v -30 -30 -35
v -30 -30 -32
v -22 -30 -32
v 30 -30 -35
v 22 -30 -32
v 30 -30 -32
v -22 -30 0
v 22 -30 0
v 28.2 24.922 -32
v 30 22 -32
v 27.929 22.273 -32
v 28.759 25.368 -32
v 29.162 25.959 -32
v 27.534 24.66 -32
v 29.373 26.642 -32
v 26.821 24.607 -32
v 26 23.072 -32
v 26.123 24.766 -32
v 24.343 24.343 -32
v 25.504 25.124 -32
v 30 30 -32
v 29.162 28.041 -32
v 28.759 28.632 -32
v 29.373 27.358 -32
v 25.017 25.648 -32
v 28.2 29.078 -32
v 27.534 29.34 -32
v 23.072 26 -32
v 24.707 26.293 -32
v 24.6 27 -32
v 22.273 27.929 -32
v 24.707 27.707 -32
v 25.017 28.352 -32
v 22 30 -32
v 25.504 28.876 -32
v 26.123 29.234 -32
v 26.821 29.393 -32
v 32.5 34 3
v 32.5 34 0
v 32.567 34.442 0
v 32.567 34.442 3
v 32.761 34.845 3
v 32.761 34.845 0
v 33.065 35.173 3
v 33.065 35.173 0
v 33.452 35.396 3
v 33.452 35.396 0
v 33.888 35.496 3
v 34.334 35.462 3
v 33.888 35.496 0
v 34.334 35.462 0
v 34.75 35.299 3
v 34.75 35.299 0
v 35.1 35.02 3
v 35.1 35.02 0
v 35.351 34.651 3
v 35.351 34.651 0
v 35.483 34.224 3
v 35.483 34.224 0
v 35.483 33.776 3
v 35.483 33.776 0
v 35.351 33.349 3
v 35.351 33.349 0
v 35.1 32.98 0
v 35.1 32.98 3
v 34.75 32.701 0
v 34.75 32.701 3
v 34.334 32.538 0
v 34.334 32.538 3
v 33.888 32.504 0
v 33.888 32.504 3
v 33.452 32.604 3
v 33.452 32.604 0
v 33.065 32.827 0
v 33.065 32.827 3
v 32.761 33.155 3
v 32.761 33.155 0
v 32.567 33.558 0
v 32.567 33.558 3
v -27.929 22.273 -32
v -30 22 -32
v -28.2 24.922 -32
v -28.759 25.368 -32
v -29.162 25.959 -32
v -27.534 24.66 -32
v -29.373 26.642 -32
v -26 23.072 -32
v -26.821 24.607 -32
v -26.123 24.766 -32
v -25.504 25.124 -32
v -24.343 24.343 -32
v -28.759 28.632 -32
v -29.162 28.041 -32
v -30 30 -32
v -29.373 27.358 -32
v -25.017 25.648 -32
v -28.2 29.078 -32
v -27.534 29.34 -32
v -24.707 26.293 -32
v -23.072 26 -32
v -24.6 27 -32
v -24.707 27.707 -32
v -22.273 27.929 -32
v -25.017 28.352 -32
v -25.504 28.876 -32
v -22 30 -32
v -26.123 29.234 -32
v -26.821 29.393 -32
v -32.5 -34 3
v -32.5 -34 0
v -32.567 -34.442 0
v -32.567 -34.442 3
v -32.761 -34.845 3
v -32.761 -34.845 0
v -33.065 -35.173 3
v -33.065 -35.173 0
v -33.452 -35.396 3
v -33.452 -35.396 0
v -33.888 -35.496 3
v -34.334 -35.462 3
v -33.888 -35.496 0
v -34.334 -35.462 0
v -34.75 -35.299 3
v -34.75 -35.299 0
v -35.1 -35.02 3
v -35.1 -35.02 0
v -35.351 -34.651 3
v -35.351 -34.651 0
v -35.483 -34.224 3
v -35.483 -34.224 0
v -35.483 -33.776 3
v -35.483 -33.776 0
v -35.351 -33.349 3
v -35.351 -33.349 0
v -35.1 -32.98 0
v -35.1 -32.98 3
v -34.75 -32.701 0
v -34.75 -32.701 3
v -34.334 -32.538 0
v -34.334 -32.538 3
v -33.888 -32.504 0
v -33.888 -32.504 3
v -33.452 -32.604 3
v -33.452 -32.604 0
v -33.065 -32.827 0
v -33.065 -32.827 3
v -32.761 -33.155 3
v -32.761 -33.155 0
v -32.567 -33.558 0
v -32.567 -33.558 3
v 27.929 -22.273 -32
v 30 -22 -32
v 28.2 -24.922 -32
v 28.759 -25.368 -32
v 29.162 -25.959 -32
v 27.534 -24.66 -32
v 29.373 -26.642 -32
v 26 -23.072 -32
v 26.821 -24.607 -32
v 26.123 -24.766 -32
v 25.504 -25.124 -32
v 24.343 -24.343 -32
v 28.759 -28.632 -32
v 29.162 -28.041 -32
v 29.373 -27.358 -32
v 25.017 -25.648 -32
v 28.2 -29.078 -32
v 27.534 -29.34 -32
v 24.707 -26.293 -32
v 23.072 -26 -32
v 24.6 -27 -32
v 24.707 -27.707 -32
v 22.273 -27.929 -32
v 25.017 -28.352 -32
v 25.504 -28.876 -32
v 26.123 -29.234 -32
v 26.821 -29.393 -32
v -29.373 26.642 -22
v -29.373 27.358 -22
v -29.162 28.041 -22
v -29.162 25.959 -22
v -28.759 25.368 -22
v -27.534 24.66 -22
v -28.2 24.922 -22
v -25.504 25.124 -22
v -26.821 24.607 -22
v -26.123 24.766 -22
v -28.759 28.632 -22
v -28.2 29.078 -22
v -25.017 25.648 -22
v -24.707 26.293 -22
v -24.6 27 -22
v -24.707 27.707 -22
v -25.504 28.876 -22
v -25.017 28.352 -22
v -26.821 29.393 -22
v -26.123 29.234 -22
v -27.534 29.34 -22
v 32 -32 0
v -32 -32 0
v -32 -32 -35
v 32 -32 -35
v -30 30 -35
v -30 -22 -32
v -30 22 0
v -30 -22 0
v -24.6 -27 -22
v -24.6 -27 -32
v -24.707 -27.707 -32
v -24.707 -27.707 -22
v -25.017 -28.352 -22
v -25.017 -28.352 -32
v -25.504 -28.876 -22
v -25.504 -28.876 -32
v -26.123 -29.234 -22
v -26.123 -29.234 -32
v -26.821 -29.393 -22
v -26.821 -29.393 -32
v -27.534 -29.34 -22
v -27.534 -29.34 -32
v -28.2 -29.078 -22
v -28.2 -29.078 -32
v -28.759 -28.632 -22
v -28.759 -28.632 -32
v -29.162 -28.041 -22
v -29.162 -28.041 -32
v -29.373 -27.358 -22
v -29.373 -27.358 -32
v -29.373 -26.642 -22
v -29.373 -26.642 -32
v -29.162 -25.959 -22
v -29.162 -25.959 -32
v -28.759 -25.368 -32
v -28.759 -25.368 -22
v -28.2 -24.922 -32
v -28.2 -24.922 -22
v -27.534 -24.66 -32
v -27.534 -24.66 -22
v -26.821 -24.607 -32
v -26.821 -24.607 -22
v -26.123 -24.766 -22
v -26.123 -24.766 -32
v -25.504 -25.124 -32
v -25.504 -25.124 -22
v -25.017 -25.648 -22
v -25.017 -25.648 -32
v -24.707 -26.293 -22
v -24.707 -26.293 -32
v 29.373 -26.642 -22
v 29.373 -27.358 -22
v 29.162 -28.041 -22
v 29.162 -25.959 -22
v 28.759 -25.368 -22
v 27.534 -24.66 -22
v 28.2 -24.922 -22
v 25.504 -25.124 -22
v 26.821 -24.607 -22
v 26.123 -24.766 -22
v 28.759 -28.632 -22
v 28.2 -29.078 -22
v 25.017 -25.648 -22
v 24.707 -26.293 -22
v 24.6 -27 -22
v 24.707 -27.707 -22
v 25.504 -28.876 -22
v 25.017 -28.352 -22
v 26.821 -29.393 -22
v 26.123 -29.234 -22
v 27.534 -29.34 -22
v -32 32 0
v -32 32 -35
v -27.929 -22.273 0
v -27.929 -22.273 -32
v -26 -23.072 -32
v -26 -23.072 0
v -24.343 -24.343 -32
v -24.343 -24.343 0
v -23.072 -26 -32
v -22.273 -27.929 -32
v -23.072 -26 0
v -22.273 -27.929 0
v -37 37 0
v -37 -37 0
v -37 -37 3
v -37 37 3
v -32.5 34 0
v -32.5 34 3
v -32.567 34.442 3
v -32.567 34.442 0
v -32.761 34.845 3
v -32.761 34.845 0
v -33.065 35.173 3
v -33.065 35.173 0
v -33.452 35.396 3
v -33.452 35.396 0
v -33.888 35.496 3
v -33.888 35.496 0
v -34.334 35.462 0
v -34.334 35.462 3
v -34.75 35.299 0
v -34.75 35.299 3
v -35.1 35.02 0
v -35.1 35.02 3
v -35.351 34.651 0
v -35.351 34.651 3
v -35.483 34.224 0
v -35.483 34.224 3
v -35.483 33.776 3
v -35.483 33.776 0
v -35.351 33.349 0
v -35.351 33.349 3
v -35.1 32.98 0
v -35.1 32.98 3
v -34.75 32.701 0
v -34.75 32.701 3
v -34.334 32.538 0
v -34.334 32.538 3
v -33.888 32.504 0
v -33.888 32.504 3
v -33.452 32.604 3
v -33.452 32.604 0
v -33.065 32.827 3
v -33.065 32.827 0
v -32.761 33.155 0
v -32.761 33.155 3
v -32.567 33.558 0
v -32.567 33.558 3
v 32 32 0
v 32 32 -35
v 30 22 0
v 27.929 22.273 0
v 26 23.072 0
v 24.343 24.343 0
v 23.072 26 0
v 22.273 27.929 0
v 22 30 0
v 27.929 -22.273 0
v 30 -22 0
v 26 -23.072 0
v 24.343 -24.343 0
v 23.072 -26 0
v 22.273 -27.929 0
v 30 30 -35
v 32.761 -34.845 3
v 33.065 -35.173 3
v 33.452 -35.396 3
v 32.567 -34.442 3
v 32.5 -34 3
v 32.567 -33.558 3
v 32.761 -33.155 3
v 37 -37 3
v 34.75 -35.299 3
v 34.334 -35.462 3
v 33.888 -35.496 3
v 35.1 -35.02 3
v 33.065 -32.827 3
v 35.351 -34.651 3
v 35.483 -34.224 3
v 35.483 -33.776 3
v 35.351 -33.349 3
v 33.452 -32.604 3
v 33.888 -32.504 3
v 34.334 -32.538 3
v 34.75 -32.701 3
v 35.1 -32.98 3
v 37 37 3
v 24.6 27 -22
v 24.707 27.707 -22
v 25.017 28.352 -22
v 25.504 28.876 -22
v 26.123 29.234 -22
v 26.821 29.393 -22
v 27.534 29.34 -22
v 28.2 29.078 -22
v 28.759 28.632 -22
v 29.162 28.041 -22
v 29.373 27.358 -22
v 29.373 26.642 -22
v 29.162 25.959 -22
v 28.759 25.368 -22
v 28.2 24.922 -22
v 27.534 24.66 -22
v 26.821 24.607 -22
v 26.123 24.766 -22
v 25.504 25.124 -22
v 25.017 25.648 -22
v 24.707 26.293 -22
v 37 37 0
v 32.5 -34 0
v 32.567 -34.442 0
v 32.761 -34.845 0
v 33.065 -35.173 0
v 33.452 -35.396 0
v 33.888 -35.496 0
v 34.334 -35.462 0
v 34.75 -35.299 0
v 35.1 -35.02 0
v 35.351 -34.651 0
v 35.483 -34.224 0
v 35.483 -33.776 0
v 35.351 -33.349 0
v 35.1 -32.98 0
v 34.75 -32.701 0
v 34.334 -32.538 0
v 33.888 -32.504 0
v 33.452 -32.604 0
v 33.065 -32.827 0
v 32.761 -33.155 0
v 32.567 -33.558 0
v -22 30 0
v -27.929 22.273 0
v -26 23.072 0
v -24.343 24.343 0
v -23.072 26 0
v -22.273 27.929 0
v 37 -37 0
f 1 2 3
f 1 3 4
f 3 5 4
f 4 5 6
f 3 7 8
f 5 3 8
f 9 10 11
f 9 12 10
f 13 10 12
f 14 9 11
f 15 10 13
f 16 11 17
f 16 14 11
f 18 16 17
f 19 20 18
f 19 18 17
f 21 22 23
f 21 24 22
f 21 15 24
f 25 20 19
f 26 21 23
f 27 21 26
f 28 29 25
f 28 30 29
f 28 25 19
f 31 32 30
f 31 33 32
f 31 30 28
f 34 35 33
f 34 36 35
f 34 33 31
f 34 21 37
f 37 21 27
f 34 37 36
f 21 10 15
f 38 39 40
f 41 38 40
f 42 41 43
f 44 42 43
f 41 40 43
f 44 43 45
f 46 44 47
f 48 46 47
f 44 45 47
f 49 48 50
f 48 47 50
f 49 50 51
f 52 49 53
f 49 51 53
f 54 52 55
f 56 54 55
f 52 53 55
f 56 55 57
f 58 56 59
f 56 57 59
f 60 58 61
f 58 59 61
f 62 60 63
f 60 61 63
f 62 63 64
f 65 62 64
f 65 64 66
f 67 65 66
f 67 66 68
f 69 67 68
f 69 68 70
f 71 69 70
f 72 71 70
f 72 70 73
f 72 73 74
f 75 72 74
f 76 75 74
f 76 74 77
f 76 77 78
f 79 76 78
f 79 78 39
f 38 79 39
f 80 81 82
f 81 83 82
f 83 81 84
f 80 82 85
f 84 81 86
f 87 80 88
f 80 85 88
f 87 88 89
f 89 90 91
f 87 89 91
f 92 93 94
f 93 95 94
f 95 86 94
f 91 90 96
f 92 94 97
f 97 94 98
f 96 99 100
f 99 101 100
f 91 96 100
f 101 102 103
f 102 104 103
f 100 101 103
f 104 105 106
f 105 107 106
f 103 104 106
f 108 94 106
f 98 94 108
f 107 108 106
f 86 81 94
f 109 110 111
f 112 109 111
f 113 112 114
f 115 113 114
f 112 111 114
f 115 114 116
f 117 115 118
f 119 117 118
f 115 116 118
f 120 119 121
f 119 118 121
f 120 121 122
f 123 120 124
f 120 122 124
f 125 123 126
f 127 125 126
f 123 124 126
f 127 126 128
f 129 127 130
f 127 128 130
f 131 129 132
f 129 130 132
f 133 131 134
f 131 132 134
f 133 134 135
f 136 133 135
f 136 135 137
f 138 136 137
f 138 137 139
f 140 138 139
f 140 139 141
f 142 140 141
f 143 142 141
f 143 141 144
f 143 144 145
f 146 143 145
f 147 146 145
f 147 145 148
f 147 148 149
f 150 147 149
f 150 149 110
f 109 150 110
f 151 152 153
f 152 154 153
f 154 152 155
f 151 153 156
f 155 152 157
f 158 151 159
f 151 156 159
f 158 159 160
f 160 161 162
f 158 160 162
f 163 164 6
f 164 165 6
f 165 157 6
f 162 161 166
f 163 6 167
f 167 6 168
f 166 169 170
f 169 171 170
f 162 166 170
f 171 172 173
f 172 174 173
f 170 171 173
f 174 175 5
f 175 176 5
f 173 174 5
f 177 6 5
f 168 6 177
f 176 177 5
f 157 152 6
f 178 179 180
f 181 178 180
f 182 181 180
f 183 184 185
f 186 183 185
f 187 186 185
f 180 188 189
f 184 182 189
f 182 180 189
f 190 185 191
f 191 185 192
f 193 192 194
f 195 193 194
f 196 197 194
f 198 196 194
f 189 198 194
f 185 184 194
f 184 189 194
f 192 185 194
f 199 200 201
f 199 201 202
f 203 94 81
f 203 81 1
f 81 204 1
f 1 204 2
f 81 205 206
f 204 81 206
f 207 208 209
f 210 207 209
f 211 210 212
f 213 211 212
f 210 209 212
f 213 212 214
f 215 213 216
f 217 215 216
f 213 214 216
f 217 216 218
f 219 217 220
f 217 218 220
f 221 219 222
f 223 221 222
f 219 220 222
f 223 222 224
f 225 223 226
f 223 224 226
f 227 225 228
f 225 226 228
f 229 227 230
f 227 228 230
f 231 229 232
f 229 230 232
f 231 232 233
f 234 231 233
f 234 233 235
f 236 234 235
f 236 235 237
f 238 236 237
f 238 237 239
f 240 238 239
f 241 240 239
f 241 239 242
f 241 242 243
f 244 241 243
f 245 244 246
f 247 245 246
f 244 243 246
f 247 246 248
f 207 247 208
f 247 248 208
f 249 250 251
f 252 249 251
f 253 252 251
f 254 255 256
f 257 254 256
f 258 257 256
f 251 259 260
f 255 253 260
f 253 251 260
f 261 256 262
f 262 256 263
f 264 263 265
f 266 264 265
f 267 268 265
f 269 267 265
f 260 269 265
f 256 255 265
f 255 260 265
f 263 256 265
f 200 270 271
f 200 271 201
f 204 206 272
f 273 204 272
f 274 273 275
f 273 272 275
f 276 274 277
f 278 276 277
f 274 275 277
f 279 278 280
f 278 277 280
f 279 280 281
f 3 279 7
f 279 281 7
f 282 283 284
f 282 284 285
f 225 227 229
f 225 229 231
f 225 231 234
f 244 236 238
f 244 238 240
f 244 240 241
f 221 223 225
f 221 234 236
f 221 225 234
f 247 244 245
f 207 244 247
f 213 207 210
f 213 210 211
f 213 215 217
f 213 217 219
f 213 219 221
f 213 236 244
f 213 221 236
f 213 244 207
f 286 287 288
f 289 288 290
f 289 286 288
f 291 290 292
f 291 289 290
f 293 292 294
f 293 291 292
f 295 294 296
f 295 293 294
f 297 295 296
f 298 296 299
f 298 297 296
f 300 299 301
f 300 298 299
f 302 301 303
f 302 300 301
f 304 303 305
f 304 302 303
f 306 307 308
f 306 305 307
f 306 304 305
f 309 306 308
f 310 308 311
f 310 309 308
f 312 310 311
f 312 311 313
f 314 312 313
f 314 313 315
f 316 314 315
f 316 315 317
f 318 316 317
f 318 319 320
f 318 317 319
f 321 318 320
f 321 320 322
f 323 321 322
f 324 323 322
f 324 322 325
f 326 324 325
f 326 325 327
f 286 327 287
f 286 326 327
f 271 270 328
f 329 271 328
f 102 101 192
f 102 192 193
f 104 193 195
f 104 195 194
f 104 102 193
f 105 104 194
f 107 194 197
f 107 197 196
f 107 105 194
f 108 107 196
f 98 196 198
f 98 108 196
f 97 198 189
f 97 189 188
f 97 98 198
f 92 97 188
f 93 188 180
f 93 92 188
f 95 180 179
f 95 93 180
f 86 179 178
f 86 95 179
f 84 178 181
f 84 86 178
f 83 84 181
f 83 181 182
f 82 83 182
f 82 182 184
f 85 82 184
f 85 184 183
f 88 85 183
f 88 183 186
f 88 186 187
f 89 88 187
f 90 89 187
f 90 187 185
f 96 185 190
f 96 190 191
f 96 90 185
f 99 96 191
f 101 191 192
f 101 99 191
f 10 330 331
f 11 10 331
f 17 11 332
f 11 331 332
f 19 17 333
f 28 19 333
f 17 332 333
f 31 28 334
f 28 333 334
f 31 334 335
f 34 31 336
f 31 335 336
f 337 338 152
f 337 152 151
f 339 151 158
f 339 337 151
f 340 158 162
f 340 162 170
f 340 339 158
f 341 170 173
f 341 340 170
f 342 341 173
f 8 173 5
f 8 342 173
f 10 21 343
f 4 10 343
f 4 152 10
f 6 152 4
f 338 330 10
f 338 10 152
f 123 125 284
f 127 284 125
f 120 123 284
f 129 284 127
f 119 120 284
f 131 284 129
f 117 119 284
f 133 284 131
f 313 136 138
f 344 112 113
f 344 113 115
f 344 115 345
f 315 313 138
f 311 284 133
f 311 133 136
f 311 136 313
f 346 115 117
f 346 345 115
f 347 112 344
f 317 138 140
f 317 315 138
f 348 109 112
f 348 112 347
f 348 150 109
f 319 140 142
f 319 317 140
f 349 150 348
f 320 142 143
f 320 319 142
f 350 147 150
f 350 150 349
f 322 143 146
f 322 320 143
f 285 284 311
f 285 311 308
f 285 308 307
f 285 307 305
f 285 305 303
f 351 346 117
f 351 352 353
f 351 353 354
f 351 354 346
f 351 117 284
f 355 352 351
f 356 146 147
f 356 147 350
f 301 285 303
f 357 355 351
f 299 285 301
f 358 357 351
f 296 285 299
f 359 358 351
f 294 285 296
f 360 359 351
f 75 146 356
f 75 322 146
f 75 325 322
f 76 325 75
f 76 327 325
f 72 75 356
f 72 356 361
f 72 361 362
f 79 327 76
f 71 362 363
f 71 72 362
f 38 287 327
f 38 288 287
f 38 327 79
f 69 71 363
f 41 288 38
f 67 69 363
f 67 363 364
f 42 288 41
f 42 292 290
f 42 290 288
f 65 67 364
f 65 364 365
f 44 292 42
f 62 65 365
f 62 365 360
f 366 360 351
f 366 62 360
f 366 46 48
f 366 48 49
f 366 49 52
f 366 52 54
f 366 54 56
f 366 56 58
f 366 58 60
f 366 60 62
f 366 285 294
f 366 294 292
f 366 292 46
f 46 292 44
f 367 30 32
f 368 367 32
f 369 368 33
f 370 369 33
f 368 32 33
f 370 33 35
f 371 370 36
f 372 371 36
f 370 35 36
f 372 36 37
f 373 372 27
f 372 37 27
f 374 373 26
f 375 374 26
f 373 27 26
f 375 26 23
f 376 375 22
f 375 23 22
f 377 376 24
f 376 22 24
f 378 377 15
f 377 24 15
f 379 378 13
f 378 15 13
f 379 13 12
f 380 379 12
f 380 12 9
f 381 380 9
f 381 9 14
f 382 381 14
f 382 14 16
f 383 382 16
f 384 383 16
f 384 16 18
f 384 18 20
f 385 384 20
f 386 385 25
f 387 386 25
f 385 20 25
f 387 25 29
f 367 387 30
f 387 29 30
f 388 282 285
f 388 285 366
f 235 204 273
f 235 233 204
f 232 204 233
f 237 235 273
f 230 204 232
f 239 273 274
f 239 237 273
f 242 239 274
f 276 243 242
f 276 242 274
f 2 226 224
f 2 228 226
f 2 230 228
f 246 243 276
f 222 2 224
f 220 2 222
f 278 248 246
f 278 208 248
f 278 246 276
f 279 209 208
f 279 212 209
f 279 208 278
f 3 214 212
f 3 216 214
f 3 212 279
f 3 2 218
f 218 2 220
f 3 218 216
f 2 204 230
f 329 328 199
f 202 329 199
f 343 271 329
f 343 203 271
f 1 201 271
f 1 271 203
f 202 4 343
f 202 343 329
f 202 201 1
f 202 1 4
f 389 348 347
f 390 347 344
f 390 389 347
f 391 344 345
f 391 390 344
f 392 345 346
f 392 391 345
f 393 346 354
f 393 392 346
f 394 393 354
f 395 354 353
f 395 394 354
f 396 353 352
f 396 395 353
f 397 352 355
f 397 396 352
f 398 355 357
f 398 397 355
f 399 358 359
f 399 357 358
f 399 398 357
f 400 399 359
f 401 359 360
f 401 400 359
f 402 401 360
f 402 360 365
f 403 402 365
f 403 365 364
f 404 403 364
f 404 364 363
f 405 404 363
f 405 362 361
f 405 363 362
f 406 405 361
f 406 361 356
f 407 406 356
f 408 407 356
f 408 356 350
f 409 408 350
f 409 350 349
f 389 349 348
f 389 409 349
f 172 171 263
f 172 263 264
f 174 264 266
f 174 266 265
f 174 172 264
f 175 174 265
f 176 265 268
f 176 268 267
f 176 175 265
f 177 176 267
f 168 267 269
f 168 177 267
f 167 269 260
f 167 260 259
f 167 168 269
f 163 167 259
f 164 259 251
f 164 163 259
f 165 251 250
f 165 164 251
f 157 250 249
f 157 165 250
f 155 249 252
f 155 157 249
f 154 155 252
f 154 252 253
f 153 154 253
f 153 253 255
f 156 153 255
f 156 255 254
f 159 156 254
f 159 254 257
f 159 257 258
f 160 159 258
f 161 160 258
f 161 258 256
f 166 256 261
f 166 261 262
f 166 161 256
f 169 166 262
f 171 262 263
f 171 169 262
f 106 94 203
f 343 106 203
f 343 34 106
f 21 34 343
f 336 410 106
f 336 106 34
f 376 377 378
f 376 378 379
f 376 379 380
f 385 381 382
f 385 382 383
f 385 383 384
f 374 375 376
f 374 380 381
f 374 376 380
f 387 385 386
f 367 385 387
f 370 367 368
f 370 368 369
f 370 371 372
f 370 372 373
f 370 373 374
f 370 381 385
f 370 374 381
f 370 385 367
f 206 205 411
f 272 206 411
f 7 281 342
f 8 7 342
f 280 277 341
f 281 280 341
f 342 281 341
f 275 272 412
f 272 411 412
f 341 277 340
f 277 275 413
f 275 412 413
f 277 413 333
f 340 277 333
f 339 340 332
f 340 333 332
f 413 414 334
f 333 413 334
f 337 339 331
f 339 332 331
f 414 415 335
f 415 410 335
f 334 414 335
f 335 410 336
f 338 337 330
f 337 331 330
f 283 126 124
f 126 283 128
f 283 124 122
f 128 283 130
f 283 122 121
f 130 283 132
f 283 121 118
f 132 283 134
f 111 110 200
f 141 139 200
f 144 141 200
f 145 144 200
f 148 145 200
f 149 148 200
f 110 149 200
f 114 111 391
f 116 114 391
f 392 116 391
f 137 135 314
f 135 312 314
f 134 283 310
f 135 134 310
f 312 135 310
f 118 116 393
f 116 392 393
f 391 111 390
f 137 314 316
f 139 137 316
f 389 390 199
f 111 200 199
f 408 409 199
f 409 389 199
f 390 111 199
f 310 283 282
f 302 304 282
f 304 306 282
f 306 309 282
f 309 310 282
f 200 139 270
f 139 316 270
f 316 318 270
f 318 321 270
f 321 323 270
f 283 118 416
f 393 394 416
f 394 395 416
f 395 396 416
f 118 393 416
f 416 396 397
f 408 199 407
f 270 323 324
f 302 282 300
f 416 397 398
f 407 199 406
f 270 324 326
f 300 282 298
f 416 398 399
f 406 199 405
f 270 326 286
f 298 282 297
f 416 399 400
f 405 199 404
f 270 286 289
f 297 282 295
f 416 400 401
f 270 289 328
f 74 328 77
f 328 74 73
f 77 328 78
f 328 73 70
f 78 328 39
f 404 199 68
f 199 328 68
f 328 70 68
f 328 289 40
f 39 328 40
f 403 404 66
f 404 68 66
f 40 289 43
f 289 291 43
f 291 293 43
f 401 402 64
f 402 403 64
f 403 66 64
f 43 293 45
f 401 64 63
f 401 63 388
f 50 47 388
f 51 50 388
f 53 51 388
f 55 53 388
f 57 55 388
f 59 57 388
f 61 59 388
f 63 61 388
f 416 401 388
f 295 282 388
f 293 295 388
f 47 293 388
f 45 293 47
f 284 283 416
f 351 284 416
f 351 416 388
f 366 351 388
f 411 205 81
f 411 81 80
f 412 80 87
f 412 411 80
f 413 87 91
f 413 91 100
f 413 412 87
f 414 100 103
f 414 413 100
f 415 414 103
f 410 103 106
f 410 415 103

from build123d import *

# Parameters (mm, degrees)
SKETCH_W                   = 74
SKETCH_H                   = 74
PAD_DEPTH                  = 3
SKETCH002_W                = 64
SKETCH002_H                = 64
SKETCH002_W_2              = 60
SKETCH002_H_2              = 60
PAD001_DEPTH               = 35
SKETCH003_R                = 1.5
POCKET_DEPTH               = 225.675651
PAD002_DEPTH               = 32
SKETCH005_R                = 2.4
POCKET001_DEPTH            = 10
SKETCH003_MIRRORED_2_R     = 1.5
POCKET_MIRRORED_2_DEPTH    = 225.675651
PAD002_MIRRORED_2_DEPTH    = 32
SKETCH005_MIRRORED_2_R     = 2.4
POCKET001_MIRRORED_2_DEPTH = 10


with BuildPart() as part:
    # Sketch → Pad (new body)
    with BuildSketch(Plane.XY):
        Rectangle(SKETCH_W, SKETCH_H)
    extrude(amount=PAD_DEPTH)

    # Sketch002 (on Face5 of Pad) → Pad001 (join)
    with BuildSketch(Plane(origin=(0, 0, 0), x_dir=(1, 0, 0), z_dir=(0, 0, -1))):
        Rectangle(SKETCH002_W, SKETCH002_H)
        Rectangle(SKETCH002_W_2, SKETCH002_H_2, mode=Mode.SUBTRACT)
    extrude(amount=PAD001_DEPTH)

    # Sketch003 (on Face4 of Pad001) → Pocket (cut, through all)
    with BuildSketch(Plane(origin=(0, 0, 0), x_dir=(1, 0, 0), z_dir=(0, 0, -1))):
        with Locations((-34, 34)):
            Circle(SKETCH003_R)
    pocket = extrude(amount=-POCKET_DEPTH, mode=Mode.SUBTRACT)

    # Sketch004 (on Face17 of Pocket) → Pad002 (join)
    with BuildSketch(Plane(origin=(0, 0, 0), x_dir=(1, 0, 0), z_dir=(0, 0, -1))):
        with BuildLine():
            ThreePointArc((-30, 22), (-24.343146, 24.343146), (-22, 30))
            Line((-30, 30), (-22, 30))
            Line((-30, 30), (-30, 22))
        make_face()
    pad002 = extrude(amount=PAD002_DEPTH)

    # Sketch005 (on Face17 of Pad002) → Pocket001 (cut)
    with BuildSketch(Plane(origin=(0, 0, -32), x_dir=(1, 0, 0), z_dir=(0, 0, -1))):
        with Locations((-27, 27)):
            Circle(SKETCH005_R)
    pocket001 = extrude(amount=-POCKET001_DEPTH, mode=Mode.SUBTRACT)

    # Sketch003 Mirrored 2 → Pocket Mirrored 2 (cut, through all)
    with BuildSketch(Plane(origin=(0, 0, 0), x_dir=(-1, 0, 0), z_dir=(0, 0, 1))):
        with Locations((-34, 34)):
            Circle(SKETCH003_MIRRORED_2_R)
    pocket_mirrored_2 = extrude(amount=POCKET_MIRRORED_2_DEPTH, mode=Mode.SUBTRACT)

    # Sketch004 Mirrored 2 → Pad002 Mirrored 2 (add)
    with BuildSketch(Plane(origin=(0, 0, 0), x_dir=(-1, 0, 0), z_dir=(0, 0, 1))):
        with BuildLine():
            ThreePointArc((-30, 22), (-24.343146, 24.343146), (-22, 30))
            Line((-30, 30), (-22, 30))
            Line((-30, 30), (-30, 22))
        make_face()
    pad002_mirrored_2 = extrude(amount=-PAD002_MIRRORED_2_DEPTH)

    # Sketch005 Mirrored 2 → Pocket001 Mirrored 2 (cut)
    with BuildSketch(Plane(origin=(0, 0, -32), x_dir=(-1, 0, 0), z_dir=(0, 0, 1))):
        with Locations((-27, 27)):
            Circle(SKETCH005_MIRRORED_2_R)
    pocket001_mirrored_2 = extrude(amount=POCKET001_MIRRORED_2_DEPTH, mode=Mode.SUBTRACT)

    # Mirrored001: Pocket, Pad002, Pocket001, Pocket Mirrored 2, Pad002 Mirrored 2, Pocket001 Mirrored 2 across Sketch003 H_Axis
    add(pocket.mirror(Plane(origin=(0, 0, 0), x_dir=(0, 0, -1), z_dir=(0, -1, 0))), mode=Mode.SUBTRACT)
    add(pad002.mirror(Plane(origin=(0, 0, 0), x_dir=(0, 0, -1), z_dir=(0, -1, 0))))
    add(pocket001.mirror(Plane(origin=(0, 0, 0), x_dir=(0, 0, -1), z_dir=(0, -1, 0))), mode=Mode.SUBTRACT)
    add(pocket_mirrored_2.mirror(Plane(origin=(0, 0, 0), x_dir=(0, 0, -1), z_dir=(0, -1, 0))), mode=Mode.SUBTRACT)
    add(pad002_mirrored_2.mirror(Plane(origin=(0, 0, 0), x_dir=(0, 0, -1), z_dir=(0, -1, 0))))
    add(pocket001_mirrored_2.mirror(Plane(origin=(0, 0, 0), x_dir=(0, 0, -1), z_dir=(0, -1, 0))), mode=Mode.SUBTRACT)


solid = part.part
